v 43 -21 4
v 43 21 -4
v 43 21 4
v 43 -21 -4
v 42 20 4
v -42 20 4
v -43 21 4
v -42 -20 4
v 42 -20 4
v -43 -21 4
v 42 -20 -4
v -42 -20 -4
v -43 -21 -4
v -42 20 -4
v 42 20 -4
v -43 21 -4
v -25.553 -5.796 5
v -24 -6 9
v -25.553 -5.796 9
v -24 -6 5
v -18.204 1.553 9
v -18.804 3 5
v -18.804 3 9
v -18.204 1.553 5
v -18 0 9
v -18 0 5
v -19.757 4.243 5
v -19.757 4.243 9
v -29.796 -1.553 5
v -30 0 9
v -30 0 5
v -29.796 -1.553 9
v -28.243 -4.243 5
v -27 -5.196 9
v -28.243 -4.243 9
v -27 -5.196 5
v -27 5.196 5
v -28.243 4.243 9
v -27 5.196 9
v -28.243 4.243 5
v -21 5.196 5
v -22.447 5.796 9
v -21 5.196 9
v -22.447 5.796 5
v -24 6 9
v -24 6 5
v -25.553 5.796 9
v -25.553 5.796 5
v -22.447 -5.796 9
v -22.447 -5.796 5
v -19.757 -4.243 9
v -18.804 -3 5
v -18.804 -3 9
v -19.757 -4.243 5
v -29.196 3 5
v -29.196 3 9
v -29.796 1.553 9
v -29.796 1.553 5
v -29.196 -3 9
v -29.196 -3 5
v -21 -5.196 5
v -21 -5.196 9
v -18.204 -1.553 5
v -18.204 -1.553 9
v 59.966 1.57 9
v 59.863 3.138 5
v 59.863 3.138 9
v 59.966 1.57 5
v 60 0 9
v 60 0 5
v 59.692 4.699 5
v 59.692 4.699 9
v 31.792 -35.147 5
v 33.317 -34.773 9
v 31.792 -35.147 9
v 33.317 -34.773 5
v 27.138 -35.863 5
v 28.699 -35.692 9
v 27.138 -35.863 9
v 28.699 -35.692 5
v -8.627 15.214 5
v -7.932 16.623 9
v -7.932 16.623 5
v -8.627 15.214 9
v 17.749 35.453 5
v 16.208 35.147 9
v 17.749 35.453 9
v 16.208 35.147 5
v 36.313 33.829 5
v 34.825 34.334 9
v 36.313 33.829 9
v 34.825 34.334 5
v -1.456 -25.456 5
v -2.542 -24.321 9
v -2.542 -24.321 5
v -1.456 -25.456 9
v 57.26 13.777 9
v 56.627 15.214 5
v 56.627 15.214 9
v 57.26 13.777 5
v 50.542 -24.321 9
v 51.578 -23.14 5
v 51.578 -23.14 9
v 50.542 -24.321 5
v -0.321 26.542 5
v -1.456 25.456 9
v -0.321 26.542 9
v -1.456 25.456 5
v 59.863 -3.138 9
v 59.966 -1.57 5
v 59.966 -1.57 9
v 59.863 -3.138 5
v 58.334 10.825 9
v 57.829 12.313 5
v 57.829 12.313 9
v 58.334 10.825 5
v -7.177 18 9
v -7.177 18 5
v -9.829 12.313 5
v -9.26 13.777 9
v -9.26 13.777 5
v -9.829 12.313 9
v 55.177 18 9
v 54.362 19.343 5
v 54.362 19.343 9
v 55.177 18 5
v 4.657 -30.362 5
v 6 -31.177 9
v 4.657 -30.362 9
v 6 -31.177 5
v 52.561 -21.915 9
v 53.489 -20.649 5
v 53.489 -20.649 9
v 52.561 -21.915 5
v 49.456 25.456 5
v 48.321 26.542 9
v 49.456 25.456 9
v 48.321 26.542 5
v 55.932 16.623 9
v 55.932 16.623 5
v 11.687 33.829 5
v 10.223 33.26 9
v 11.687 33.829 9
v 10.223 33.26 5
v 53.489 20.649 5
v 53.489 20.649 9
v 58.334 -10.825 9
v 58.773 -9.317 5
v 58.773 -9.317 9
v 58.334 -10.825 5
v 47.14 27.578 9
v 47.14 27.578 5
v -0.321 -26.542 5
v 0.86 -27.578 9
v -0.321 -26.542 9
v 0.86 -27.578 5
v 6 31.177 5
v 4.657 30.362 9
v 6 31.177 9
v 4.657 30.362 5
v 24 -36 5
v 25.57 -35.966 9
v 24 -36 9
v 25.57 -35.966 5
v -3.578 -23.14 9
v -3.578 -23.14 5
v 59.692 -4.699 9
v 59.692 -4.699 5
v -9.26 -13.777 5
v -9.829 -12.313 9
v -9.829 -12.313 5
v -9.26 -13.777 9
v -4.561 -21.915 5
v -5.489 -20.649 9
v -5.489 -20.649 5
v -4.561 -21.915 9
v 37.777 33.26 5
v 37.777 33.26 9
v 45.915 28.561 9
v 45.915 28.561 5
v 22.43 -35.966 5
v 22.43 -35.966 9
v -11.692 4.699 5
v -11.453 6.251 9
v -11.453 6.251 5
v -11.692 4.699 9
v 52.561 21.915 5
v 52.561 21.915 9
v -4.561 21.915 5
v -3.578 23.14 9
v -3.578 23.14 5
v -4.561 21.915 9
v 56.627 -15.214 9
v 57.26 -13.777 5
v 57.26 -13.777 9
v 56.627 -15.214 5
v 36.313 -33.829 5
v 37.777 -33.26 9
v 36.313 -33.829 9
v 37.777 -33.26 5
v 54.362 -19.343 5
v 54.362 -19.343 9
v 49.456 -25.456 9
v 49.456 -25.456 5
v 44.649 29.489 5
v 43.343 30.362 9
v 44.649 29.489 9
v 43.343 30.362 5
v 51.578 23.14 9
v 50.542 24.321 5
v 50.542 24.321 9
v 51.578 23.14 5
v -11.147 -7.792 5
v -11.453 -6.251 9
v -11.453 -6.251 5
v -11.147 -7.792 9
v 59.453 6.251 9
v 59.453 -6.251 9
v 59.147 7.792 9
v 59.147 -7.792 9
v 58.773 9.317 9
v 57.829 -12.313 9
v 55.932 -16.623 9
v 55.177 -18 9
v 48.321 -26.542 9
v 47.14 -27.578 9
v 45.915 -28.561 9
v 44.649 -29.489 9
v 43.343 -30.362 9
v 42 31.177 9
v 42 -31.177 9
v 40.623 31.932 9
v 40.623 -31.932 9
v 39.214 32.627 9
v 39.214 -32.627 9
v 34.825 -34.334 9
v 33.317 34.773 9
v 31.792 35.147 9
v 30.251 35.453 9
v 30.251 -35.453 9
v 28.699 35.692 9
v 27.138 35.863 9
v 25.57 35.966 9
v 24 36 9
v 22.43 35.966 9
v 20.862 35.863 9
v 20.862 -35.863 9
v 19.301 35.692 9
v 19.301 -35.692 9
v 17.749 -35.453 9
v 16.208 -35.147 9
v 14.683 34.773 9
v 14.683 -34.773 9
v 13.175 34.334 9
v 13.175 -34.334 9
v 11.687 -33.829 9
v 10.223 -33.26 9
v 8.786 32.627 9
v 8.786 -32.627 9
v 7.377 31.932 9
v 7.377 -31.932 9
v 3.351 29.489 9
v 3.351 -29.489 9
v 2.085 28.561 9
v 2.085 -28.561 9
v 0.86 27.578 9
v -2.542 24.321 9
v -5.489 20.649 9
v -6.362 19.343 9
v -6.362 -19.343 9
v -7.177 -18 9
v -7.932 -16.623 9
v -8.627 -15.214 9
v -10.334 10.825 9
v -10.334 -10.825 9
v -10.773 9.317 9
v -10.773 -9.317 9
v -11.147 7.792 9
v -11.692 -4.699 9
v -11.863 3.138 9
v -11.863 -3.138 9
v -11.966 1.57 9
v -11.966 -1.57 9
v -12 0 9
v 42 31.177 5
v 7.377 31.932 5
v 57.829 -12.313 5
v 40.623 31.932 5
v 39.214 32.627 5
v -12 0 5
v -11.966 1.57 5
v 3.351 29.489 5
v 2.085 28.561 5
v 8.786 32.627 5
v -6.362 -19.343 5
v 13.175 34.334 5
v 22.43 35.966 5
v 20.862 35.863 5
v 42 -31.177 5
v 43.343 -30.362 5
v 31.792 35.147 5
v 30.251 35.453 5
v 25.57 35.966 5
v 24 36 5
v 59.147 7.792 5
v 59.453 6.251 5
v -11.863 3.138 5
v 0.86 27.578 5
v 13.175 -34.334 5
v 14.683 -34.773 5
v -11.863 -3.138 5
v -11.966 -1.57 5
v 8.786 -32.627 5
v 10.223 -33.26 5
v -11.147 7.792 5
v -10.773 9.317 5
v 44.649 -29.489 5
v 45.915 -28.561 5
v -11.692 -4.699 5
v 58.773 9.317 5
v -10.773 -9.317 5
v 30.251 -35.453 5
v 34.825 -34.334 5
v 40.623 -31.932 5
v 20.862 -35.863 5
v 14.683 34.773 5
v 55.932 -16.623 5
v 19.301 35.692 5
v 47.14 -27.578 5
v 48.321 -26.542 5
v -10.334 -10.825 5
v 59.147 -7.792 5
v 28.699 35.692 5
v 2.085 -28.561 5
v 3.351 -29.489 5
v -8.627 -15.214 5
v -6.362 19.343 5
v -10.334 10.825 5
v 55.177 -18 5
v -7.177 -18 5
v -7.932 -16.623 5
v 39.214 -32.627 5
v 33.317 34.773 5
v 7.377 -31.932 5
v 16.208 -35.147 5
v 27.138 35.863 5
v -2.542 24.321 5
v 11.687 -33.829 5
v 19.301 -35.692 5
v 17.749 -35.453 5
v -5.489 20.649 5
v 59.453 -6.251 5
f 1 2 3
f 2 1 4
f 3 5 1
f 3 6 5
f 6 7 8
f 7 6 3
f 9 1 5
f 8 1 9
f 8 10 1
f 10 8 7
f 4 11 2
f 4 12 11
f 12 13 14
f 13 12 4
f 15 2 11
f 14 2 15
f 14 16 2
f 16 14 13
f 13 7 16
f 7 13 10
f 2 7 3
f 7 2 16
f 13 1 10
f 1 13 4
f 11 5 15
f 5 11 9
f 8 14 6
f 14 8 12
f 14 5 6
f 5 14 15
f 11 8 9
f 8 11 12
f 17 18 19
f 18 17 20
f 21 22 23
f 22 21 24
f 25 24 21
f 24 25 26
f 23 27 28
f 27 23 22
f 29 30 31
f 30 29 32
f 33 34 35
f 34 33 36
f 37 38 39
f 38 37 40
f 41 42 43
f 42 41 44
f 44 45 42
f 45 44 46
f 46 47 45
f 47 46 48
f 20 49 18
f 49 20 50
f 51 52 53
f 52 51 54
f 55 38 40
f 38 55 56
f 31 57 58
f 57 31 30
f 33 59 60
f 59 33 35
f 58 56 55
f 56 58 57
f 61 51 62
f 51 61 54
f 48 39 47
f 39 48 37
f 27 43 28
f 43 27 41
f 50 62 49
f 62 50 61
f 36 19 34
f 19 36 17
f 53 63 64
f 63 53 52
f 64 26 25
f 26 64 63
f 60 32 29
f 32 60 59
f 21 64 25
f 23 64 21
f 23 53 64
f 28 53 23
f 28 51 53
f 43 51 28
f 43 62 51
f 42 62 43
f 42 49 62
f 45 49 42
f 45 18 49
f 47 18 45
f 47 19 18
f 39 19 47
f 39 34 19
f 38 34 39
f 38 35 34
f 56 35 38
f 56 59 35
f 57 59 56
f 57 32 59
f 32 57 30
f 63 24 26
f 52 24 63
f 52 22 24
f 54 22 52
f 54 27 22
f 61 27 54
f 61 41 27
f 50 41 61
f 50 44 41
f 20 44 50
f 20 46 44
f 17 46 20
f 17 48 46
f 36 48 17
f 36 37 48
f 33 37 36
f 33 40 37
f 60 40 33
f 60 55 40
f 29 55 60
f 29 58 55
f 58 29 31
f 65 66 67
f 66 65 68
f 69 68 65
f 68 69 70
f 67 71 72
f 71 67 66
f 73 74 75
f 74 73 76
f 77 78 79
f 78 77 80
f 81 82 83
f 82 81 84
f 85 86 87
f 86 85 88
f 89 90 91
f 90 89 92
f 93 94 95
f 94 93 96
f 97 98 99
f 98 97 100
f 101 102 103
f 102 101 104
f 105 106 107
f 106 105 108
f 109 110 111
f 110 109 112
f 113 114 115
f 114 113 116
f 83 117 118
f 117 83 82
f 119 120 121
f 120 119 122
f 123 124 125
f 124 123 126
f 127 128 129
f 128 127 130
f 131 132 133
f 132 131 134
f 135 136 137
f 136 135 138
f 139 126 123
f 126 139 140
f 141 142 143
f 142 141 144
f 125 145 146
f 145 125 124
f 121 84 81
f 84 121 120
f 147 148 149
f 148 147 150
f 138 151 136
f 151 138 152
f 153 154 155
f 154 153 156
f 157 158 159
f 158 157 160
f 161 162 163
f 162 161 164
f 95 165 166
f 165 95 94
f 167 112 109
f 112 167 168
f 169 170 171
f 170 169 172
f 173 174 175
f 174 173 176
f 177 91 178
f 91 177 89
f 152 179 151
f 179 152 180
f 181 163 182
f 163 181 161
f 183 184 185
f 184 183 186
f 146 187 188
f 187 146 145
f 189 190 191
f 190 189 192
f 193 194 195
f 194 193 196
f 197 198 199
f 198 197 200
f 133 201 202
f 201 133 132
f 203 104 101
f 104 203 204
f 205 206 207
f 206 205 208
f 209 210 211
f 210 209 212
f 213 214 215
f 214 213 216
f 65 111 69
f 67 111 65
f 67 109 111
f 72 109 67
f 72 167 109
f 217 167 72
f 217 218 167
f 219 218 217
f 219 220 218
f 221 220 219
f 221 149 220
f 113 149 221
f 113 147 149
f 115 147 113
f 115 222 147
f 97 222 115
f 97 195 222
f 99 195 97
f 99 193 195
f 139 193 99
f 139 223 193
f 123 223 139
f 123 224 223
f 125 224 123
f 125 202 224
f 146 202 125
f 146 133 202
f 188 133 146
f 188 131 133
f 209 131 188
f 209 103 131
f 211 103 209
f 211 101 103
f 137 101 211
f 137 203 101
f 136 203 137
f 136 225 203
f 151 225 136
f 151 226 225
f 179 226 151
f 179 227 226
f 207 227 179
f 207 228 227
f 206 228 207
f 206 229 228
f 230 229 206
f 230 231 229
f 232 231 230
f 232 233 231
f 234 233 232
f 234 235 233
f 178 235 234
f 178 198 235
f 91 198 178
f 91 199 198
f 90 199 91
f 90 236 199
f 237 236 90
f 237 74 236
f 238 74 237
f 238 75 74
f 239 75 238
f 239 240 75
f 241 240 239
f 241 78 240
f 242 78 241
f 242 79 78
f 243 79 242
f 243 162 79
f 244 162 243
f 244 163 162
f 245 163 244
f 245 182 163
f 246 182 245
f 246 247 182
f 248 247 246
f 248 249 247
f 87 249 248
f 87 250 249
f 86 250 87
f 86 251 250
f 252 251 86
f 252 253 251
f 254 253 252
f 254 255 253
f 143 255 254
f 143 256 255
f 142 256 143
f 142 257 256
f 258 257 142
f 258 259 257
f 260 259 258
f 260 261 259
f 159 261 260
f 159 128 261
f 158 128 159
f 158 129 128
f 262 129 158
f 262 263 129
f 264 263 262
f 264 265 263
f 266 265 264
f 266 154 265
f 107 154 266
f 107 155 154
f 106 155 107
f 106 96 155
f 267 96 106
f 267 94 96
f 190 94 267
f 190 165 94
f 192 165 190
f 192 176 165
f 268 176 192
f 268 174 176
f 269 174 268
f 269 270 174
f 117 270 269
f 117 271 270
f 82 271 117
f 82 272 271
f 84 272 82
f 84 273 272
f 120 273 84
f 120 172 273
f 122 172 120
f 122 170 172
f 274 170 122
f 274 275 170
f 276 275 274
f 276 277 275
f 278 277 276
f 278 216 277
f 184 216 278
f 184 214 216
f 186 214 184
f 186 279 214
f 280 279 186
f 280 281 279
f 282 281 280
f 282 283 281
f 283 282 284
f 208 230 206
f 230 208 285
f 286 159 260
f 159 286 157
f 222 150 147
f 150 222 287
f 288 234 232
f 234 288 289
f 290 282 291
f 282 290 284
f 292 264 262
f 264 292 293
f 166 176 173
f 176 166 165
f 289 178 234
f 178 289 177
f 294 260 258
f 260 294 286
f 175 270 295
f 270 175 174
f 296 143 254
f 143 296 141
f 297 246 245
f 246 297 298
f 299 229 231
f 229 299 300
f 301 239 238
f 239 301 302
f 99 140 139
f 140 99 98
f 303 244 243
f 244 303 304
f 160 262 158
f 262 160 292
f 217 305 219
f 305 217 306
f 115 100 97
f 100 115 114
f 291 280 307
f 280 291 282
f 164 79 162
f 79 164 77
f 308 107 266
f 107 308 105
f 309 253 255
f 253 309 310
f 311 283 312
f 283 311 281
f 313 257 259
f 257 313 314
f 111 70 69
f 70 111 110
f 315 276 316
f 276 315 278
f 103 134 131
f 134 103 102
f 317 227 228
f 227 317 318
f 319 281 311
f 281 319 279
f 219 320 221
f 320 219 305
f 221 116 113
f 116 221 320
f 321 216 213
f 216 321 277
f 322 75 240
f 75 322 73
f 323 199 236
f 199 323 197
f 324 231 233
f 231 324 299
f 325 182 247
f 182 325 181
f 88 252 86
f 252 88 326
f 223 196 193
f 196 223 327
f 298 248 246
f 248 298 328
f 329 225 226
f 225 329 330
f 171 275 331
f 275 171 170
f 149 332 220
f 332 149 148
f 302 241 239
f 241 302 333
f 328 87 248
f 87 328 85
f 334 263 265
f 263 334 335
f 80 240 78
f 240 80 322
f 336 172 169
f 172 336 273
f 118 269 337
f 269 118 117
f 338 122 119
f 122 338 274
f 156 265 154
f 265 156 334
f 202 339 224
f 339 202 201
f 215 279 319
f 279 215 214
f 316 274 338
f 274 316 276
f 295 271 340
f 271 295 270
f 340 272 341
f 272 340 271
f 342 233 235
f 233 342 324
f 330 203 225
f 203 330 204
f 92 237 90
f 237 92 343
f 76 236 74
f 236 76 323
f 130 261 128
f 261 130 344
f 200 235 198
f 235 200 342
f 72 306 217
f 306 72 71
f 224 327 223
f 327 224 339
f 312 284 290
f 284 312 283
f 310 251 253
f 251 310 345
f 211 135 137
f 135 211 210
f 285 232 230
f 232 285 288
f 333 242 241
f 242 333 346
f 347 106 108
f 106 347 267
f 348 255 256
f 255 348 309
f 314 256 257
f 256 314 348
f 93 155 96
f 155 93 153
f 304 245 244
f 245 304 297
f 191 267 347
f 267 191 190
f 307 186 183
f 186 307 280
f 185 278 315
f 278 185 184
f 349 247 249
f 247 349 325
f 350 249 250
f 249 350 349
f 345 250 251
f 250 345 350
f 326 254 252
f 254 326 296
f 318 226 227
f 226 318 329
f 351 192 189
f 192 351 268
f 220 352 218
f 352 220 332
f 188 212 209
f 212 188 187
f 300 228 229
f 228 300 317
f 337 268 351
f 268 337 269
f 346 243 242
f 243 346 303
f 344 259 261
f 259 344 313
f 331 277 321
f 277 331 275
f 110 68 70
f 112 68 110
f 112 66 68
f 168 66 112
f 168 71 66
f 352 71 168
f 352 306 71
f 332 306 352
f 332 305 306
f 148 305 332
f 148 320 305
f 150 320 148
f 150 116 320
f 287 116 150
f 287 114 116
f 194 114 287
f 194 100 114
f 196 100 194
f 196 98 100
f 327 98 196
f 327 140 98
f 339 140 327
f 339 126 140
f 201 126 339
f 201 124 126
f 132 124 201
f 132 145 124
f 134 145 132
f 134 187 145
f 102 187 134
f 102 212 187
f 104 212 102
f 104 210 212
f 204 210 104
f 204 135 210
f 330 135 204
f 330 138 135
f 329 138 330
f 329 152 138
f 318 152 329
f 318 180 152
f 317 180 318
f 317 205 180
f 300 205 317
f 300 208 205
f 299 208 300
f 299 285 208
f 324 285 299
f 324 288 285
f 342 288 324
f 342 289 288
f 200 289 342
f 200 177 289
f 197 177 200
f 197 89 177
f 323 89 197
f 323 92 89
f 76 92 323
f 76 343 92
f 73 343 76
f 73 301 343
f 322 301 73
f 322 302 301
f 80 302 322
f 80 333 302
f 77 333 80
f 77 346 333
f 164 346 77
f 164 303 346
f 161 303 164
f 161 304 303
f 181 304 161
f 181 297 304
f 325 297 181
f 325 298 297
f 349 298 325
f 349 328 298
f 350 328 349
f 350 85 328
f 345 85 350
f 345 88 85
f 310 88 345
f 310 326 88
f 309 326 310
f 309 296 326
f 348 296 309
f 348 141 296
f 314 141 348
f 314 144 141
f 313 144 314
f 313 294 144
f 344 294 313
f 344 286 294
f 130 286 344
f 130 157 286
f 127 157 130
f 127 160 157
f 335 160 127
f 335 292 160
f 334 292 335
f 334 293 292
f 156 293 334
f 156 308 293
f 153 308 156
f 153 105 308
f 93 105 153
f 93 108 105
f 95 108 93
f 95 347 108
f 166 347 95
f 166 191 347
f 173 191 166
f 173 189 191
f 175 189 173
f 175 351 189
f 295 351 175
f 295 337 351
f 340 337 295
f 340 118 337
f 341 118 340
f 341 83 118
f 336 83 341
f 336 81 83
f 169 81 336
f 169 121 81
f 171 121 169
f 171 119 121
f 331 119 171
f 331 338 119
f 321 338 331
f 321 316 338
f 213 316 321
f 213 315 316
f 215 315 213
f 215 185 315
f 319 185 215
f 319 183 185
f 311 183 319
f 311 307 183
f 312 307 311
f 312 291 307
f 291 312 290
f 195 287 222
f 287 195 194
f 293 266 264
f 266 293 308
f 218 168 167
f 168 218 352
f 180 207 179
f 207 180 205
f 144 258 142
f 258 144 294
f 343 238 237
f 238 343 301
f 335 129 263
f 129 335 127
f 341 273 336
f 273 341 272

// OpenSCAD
// MiniClaw drive housing checkpoint 1
// OpenSCAD concept source used for MP3 Part B CAD review.

module_name = "MiniClaw drive housing v1";
housing_wall = 1.0;       // mm, copied too closely from BigClaw aluminum
pinion_teeth = 12;        // module 1.0, below ACME-ENG-001 minimum
output_teeth = 72;
gear_module = 1.0;
face_width = 4.0;         // mm
nominal_backlash = 0.08;  // mm, too tight for PLA
pivot_bore = 3.02;        // mm for 3.00 mm pin

// Visual placeholder geometry. The review focused on parameters above.
module gear_disc(teeth, radius, width) {
  cylinder(h = width, r = radius, $fn = teeth * 2);
}

difference() {
  cube([86, 42, 8], center = true);
  translate([0, 0, -1]) cube([86 - 2 * housing_wall, 42 - 2 * housing_wall, 10], center = true);
  translate([-24, 0, -5]) cylinder(h = 12, d = pivot_bore, $fn = 48);
  translate([24, 0, -5]) cylinder(h = 12, d = pivot_bore, $fn = 48);
}

translate([-24, 0, 5]) gear_disc(pinion_teeth, pinion_teeth * gear_module / 2, face_width);
translate([24, 0, 5]) gear_disc(output_teeth, output_teeth * gear_module / 2, face_width);
